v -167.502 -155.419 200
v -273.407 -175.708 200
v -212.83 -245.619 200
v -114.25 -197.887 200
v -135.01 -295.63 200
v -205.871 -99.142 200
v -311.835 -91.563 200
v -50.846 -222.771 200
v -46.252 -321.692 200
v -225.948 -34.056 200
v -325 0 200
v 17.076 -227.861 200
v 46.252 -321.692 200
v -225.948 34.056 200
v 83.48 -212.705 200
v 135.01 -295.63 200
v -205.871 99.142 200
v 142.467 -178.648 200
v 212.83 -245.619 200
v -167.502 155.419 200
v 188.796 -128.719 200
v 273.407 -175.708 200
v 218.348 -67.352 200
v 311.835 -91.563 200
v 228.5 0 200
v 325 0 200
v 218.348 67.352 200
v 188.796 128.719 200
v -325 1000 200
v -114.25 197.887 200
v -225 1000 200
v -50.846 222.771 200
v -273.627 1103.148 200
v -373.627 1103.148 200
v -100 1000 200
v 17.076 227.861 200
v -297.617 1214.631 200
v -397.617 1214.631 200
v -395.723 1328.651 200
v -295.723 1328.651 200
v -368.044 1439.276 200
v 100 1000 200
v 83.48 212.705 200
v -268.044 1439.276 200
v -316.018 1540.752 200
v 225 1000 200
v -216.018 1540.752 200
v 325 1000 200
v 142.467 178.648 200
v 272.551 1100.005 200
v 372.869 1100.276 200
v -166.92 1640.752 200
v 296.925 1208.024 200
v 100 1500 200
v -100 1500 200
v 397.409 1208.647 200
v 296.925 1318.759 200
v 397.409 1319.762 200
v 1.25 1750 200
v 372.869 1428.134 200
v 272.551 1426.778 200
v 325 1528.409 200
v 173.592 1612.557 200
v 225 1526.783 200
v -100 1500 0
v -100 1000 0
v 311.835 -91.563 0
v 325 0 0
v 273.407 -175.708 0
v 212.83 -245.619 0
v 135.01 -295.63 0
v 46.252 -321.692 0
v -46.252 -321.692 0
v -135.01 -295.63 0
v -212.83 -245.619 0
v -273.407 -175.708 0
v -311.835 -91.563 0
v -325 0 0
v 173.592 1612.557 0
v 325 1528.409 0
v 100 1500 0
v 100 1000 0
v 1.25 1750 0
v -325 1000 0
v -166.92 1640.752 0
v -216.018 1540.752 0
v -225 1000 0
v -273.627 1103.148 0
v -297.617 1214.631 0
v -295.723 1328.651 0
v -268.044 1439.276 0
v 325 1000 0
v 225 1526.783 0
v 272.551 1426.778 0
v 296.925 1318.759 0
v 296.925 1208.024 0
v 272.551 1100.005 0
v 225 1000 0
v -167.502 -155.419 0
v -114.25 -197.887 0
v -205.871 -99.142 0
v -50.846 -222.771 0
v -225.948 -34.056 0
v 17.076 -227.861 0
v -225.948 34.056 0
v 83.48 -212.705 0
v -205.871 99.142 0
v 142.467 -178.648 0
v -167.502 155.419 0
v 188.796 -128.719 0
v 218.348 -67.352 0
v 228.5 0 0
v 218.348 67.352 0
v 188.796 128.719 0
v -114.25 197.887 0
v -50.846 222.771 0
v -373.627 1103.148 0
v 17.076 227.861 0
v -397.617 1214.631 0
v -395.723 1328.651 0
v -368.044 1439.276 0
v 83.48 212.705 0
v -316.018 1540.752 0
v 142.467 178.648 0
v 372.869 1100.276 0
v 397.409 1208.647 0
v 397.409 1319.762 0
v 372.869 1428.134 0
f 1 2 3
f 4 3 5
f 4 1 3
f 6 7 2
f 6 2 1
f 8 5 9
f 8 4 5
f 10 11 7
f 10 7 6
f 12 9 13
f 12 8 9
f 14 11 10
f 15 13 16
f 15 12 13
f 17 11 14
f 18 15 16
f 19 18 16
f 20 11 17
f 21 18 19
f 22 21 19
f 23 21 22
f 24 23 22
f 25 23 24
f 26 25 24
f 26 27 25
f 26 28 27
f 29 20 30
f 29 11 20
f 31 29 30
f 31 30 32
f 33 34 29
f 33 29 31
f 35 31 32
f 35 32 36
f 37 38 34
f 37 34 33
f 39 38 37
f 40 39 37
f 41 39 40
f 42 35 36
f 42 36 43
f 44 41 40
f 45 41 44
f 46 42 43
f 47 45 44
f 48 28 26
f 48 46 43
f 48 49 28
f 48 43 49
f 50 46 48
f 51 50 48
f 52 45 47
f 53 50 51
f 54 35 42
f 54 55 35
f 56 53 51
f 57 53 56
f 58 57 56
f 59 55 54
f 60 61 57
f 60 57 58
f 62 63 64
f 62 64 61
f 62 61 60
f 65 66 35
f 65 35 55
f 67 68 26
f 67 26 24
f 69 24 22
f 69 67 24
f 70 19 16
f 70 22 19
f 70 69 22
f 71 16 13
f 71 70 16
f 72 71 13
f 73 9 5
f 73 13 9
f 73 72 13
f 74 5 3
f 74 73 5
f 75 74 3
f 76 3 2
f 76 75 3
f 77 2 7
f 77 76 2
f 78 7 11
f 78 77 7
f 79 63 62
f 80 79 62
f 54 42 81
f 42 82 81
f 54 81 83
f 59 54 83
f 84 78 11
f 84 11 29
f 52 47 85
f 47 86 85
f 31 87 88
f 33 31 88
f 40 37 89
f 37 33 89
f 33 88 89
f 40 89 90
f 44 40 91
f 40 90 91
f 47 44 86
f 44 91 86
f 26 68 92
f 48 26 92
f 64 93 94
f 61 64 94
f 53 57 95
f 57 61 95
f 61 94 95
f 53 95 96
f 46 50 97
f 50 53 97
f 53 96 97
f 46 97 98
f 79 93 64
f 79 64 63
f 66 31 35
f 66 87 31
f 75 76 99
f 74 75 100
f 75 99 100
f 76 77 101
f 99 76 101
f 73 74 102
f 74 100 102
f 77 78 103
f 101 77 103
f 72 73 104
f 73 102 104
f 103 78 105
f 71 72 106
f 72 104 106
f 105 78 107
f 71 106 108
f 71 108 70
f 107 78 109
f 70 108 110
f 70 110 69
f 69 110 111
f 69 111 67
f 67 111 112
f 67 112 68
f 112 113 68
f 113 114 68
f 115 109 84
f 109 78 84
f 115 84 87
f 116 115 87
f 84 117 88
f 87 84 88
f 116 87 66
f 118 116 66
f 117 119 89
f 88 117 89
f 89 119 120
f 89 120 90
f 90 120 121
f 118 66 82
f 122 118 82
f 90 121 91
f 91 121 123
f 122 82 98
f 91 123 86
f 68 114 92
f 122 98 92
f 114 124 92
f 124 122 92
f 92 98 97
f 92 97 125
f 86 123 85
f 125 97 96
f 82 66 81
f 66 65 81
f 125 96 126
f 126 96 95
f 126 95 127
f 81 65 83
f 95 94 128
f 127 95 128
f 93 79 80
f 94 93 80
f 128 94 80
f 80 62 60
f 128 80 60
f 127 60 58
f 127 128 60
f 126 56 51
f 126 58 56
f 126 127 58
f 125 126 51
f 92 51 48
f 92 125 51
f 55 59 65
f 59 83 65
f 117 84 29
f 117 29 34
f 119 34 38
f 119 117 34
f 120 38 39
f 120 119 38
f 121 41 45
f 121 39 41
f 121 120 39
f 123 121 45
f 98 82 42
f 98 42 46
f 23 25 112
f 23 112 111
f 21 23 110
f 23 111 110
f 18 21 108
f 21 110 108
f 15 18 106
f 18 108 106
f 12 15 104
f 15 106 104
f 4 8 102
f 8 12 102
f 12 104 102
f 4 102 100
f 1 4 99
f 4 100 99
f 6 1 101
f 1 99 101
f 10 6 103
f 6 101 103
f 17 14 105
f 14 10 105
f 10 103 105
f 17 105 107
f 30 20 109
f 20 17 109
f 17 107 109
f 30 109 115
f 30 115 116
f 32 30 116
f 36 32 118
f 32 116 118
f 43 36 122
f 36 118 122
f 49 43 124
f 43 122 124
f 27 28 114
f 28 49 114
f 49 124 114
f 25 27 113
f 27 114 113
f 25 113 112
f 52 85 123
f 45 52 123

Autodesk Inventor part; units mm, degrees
ref_plane "YZ Plane" through (0, 0, 0) normal (1, 0, 0) x (0, 1, 0)
ref_plane "XZ Plane" through (0, 0, 0) normal (0, 1, 0) x (-1, 0, 0)
ref_plane "XY Plane" through (0, 0, 0) normal (0, 0, 1) x (1, 0, 0)
sketch "Sketch1" plane through (0, 0, 0) normal (0, 0, 1) x (1, 0, 0)
  circle A0 centre (0, 0) radius 228.5
  arc A1 (-325, 0) -> (325, 0) centre (0, 0) ccw
  line L0 (325, 0) -> (325, 1000)
  line L1 (325, 0) -> (1325, 0) construction
  line L2 (-267.2125, -184.9932) -> (732.7875, -184.9932) construction
  line L3 (-325, 0) -> (-325, 1000)
  line L4 (-325, 0) -> (675, 0) construction
  line L5 (-225, 1000) -> (225, 1000)
  line L6 (0, 1000) -> (-100, 1000)
  line L7 (-100, 1000) -> (-100, 1500)
  line L8 (0, 1000) -> (100, 1000)
  line L9 (100, 1000) -> (100, 1500)
  arc A2 (325, 1000) -> (325, 1528.4091) centre (-99.4949, 1264.2046) ccw
  arc A3 (225, 1000) -> (225, 1526.7827) centre (-200, 1263.3913) ccw
  arc A4 (-316.0183, 1540.7518) -> (-325, 1000) centre (100, 1263.3913) ccw
  arc A5 (-216.0183, 1540.7518) -> (-225, 1000) centre (200, 1263.3913) ccw
  line L10 (-216.0183, 1540.7518) -> (-166.9198, 1640.7518)
  line L11 (-166.9198, 1640.7518) -> (-316.0183, 1540.7518)
  line L12 (225, 1526.7827) -> (173.5917, 1612.5567)
  line L13 (173.5917, 1612.5567) -> (325, 1528.4091)
  line L14 (100, 1500) -> (1.2499, 1750)
  line L15 (1.2499, 1750) -> (-100, 1500)
  point P0 (100, 1250)
  dimension "d0" = 457
  dimension "d1" = 650
  dimension "d2" = 1000
  dimension "d3" = 90
  dimension "d6" = 1000
  dimension "d7" = 90
  dimension "d8" = 100
  dimension "d9" = 500
  dimension "d10" = 100
  dimension "d11" = 500
  dimension "d12" = 500
  dimension "d13" = 200
  dimension "d14" = 500
  dimension "d15" = 300
  dimension "d16" = 100
  dimension "d17" = 500
  dimension "d18" = 500
  dimension "d19" = 100
  dimension "d20" = 200
  dimension "d22" = 100
  dimension "d23" = 100
  dimension "d25" = 300
  dimension "d26" = 100
  dimension "d27" = 30
  dimension "d28" = 30
  dimension "d29" = 100
  dimension "d30" = 250
  dimension "d31" = 43.602
extrude "Extrusion1" add sketch "Sketch1" along normal blind 200
properties part number "The Gripper. (New)"
